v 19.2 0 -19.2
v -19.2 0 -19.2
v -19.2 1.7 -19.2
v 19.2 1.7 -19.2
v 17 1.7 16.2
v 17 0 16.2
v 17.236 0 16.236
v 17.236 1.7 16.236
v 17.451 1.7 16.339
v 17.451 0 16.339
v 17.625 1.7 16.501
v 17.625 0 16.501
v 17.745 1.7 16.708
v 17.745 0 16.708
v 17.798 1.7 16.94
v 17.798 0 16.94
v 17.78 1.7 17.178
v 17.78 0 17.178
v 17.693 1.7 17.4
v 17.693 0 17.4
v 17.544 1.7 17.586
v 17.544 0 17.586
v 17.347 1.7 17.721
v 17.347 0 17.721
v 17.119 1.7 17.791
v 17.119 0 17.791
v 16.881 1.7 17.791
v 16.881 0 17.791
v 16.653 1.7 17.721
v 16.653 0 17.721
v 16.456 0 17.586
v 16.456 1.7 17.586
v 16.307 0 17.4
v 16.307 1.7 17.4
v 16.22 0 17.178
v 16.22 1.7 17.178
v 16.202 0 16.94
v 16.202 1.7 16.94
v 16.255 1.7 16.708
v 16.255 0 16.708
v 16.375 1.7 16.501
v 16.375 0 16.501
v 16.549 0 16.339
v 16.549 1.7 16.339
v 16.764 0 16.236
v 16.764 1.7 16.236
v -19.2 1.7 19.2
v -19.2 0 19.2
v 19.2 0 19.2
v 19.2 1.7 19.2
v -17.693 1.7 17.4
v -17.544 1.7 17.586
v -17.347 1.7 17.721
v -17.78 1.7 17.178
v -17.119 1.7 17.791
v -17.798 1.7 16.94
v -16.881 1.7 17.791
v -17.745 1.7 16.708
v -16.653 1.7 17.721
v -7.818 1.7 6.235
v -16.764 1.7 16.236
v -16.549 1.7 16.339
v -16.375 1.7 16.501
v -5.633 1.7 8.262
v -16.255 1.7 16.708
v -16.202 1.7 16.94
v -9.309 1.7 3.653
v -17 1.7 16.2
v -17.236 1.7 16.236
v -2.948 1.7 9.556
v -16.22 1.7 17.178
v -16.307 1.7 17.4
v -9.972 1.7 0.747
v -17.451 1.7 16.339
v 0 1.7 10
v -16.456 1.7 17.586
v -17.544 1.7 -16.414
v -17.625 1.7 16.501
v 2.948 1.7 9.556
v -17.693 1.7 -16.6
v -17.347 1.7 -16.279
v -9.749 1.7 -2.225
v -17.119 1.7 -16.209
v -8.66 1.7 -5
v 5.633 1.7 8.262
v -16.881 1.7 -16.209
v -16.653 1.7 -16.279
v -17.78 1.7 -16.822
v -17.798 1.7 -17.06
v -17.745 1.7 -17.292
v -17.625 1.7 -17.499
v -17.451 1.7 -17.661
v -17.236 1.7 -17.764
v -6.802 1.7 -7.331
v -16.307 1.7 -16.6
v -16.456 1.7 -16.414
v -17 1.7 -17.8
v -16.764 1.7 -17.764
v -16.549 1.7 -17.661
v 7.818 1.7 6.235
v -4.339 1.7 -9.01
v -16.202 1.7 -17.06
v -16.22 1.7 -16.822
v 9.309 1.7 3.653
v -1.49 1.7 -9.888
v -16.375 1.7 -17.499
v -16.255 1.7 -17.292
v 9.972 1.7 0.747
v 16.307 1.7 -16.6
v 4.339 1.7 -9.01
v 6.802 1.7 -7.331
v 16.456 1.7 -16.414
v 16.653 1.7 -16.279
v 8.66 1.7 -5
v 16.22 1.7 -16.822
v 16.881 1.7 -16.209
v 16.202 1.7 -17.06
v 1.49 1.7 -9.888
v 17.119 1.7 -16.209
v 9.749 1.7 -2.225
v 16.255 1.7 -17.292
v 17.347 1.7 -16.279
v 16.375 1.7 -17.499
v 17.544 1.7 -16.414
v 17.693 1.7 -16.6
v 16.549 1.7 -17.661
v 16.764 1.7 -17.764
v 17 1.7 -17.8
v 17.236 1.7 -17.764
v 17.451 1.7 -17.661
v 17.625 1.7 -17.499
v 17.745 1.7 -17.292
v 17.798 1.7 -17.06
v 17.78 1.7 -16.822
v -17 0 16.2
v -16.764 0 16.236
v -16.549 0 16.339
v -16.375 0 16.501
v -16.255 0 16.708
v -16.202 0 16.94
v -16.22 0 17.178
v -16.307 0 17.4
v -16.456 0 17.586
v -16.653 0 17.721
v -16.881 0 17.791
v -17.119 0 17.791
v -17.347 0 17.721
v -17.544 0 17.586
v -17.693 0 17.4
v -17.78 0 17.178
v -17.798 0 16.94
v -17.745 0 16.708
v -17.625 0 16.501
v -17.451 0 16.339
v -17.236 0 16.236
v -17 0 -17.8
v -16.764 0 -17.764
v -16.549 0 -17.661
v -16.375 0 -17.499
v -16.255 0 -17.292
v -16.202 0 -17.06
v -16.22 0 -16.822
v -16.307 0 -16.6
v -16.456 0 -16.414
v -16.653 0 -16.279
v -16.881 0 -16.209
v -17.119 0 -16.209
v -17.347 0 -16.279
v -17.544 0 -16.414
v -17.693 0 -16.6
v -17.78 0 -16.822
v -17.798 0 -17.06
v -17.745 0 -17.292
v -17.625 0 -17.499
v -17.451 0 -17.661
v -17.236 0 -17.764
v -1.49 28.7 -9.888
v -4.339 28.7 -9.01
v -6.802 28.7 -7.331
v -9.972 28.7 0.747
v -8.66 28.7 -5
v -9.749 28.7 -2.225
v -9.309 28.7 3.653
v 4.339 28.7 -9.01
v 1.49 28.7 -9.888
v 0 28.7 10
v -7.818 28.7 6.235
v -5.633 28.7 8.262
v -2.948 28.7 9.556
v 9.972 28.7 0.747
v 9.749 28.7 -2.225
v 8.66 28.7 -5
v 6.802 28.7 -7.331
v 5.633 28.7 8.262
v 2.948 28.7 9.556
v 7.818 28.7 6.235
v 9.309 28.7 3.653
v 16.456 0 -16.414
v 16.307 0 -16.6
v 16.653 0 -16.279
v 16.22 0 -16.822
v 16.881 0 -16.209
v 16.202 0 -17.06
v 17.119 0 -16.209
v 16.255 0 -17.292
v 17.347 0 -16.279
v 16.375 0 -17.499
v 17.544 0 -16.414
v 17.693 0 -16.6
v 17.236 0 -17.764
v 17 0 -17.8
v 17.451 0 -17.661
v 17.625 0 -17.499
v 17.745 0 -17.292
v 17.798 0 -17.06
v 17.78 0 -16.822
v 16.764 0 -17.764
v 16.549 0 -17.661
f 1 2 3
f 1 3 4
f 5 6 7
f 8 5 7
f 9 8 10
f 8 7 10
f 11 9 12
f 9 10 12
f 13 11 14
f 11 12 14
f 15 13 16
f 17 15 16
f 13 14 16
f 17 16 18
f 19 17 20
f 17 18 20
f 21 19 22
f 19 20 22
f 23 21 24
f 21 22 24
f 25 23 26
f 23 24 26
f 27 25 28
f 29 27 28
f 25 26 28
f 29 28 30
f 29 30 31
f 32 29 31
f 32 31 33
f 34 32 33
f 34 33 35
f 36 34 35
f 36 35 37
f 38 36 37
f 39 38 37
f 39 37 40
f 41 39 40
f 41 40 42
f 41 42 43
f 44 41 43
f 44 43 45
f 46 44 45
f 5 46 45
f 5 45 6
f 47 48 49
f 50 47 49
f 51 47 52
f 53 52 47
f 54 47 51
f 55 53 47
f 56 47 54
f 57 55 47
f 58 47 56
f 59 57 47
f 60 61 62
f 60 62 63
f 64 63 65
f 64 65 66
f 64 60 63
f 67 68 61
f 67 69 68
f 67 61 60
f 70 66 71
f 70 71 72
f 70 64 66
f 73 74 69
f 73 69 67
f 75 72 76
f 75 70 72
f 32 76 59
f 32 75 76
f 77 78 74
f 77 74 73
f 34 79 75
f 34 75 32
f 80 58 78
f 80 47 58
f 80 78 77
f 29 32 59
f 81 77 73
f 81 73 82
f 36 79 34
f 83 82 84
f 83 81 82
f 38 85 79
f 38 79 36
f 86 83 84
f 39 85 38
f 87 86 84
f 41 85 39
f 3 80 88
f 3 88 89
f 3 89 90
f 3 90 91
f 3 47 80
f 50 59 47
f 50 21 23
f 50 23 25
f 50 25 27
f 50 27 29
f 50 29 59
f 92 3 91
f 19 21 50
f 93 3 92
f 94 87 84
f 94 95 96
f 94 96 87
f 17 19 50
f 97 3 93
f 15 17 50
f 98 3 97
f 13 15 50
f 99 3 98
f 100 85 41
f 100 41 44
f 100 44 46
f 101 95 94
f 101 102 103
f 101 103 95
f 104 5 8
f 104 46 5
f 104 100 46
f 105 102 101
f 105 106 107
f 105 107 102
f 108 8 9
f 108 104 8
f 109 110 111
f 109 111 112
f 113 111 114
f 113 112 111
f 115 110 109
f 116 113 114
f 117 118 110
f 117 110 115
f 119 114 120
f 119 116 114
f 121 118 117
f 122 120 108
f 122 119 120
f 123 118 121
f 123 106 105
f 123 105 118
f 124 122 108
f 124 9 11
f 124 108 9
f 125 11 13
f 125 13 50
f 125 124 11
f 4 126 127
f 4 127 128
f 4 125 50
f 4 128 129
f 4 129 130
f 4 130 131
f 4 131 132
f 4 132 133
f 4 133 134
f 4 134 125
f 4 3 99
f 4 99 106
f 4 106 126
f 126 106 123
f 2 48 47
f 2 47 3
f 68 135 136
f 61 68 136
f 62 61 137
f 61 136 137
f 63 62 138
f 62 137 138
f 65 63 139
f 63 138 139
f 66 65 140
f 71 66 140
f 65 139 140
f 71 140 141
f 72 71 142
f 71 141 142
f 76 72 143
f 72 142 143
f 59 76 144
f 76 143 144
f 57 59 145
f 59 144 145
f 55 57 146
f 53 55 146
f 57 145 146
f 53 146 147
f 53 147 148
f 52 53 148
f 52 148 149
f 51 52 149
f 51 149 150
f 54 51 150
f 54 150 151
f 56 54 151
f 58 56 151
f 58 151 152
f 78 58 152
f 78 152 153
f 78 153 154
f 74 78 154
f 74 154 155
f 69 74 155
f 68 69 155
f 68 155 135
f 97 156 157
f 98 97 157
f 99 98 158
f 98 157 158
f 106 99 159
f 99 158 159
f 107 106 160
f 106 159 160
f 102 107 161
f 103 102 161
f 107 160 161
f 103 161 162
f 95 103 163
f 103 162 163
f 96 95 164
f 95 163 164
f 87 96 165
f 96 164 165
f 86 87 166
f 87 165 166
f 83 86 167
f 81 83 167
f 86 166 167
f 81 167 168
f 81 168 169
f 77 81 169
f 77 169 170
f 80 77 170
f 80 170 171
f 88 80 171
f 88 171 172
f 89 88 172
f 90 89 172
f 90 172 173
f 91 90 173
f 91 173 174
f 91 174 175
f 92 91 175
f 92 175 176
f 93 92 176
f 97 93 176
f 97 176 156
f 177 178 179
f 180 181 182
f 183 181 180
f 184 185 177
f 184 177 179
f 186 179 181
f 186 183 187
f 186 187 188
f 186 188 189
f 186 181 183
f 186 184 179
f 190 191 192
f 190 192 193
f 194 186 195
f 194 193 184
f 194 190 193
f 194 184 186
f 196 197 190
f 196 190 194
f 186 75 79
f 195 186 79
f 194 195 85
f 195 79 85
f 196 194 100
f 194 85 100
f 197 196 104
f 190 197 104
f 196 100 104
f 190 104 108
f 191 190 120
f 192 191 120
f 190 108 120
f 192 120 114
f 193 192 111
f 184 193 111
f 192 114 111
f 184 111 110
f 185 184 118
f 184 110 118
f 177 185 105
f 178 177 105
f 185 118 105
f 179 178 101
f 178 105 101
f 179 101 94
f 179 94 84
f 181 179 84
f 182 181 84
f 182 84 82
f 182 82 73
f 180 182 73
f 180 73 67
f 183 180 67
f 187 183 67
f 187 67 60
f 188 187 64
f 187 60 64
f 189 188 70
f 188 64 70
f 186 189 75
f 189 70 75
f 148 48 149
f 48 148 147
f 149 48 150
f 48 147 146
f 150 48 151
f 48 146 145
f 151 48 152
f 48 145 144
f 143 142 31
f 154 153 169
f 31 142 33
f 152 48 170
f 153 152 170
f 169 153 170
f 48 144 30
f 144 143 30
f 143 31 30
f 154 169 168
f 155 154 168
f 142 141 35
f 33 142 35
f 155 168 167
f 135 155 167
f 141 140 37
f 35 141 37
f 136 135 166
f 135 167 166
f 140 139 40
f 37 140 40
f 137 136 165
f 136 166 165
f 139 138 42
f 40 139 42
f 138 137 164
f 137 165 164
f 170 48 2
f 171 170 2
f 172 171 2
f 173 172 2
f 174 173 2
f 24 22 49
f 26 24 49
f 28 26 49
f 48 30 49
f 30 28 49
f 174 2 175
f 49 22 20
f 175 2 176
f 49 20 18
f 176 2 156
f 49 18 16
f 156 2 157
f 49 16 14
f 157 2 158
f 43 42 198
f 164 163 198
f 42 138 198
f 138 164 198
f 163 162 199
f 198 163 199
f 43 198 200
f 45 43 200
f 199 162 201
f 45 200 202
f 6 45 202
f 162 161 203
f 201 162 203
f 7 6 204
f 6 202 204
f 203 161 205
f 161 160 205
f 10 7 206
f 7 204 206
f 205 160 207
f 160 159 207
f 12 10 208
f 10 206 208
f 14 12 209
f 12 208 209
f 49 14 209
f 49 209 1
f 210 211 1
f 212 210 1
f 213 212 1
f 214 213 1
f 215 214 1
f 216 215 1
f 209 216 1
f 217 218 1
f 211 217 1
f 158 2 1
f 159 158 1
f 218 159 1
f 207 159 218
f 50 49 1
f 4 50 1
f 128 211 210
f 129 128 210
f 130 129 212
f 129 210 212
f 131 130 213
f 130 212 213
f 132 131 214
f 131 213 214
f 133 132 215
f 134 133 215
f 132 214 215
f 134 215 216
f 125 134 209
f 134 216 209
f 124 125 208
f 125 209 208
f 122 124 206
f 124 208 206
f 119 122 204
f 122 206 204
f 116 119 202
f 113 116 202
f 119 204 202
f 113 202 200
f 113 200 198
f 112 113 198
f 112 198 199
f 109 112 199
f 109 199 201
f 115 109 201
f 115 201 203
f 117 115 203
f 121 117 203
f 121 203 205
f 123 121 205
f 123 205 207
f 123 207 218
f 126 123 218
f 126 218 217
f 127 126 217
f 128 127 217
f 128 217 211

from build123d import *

# Parameters (mm, degrees)
SKETCH_1_W          = 38.4
SKETCH_1_H          = 38.4
EXTRUDE_1_DEPTH     = 1.7
SKETCH_2_R          = 10
EXTRUDE_2_DEPTH     = 27
SKETCH_3_R          = 0.8
CUT_EXTRUDE_1_DEPTH = 10


with BuildPart() as part:
    # 草图1 → 凸台-拉伸1 (new body)
    with BuildSketch(Plane(origin=(0, 0, 0), x_dir=(1, 0, 0), z_dir=(0, 1, 0))):
        Rectangle(SKETCH_1_W, SKETCH_1_H)
    extrude(amount=EXTRUDE_1_DEPTH)

    # 草图2 → 凸台-拉伸2 (add)
    with BuildSketch(Plane(origin=(0, 1.7, 0), x_dir=(1, 0, 0), z_dir=(0, 1, 0))):
        with Locations(Location((0, 0, 0), (0, 0, 270))):
            Circle(SKETCH_2_R)
    extrude(amount=EXTRUDE_2_DEPTH)

    # 草图3 → 切除-拉伸1 (cut)
    with BuildSketch(Plane.XZ):
        with Locations(Location((-17, 17, 0), (0, 0, 270))):
            Circle(SKETCH_3_R)
        with Locations(Location((17, 17, 0), (0, 0, 270))):
            Circle(SKETCH_3_R)
        with Locations(Location((17, -17, 0), (0, 0, 270))):
            Circle(SKETCH_3_R)
        with Locations(Location((-17, -17, 0), (0, 0, 270))):
            Circle(SKETCH_3_R)
    extrude(amount=-CUT_EXTRUDE_1_DEPTH, mode=Mode.SUBTRACT)


solid = part.part
